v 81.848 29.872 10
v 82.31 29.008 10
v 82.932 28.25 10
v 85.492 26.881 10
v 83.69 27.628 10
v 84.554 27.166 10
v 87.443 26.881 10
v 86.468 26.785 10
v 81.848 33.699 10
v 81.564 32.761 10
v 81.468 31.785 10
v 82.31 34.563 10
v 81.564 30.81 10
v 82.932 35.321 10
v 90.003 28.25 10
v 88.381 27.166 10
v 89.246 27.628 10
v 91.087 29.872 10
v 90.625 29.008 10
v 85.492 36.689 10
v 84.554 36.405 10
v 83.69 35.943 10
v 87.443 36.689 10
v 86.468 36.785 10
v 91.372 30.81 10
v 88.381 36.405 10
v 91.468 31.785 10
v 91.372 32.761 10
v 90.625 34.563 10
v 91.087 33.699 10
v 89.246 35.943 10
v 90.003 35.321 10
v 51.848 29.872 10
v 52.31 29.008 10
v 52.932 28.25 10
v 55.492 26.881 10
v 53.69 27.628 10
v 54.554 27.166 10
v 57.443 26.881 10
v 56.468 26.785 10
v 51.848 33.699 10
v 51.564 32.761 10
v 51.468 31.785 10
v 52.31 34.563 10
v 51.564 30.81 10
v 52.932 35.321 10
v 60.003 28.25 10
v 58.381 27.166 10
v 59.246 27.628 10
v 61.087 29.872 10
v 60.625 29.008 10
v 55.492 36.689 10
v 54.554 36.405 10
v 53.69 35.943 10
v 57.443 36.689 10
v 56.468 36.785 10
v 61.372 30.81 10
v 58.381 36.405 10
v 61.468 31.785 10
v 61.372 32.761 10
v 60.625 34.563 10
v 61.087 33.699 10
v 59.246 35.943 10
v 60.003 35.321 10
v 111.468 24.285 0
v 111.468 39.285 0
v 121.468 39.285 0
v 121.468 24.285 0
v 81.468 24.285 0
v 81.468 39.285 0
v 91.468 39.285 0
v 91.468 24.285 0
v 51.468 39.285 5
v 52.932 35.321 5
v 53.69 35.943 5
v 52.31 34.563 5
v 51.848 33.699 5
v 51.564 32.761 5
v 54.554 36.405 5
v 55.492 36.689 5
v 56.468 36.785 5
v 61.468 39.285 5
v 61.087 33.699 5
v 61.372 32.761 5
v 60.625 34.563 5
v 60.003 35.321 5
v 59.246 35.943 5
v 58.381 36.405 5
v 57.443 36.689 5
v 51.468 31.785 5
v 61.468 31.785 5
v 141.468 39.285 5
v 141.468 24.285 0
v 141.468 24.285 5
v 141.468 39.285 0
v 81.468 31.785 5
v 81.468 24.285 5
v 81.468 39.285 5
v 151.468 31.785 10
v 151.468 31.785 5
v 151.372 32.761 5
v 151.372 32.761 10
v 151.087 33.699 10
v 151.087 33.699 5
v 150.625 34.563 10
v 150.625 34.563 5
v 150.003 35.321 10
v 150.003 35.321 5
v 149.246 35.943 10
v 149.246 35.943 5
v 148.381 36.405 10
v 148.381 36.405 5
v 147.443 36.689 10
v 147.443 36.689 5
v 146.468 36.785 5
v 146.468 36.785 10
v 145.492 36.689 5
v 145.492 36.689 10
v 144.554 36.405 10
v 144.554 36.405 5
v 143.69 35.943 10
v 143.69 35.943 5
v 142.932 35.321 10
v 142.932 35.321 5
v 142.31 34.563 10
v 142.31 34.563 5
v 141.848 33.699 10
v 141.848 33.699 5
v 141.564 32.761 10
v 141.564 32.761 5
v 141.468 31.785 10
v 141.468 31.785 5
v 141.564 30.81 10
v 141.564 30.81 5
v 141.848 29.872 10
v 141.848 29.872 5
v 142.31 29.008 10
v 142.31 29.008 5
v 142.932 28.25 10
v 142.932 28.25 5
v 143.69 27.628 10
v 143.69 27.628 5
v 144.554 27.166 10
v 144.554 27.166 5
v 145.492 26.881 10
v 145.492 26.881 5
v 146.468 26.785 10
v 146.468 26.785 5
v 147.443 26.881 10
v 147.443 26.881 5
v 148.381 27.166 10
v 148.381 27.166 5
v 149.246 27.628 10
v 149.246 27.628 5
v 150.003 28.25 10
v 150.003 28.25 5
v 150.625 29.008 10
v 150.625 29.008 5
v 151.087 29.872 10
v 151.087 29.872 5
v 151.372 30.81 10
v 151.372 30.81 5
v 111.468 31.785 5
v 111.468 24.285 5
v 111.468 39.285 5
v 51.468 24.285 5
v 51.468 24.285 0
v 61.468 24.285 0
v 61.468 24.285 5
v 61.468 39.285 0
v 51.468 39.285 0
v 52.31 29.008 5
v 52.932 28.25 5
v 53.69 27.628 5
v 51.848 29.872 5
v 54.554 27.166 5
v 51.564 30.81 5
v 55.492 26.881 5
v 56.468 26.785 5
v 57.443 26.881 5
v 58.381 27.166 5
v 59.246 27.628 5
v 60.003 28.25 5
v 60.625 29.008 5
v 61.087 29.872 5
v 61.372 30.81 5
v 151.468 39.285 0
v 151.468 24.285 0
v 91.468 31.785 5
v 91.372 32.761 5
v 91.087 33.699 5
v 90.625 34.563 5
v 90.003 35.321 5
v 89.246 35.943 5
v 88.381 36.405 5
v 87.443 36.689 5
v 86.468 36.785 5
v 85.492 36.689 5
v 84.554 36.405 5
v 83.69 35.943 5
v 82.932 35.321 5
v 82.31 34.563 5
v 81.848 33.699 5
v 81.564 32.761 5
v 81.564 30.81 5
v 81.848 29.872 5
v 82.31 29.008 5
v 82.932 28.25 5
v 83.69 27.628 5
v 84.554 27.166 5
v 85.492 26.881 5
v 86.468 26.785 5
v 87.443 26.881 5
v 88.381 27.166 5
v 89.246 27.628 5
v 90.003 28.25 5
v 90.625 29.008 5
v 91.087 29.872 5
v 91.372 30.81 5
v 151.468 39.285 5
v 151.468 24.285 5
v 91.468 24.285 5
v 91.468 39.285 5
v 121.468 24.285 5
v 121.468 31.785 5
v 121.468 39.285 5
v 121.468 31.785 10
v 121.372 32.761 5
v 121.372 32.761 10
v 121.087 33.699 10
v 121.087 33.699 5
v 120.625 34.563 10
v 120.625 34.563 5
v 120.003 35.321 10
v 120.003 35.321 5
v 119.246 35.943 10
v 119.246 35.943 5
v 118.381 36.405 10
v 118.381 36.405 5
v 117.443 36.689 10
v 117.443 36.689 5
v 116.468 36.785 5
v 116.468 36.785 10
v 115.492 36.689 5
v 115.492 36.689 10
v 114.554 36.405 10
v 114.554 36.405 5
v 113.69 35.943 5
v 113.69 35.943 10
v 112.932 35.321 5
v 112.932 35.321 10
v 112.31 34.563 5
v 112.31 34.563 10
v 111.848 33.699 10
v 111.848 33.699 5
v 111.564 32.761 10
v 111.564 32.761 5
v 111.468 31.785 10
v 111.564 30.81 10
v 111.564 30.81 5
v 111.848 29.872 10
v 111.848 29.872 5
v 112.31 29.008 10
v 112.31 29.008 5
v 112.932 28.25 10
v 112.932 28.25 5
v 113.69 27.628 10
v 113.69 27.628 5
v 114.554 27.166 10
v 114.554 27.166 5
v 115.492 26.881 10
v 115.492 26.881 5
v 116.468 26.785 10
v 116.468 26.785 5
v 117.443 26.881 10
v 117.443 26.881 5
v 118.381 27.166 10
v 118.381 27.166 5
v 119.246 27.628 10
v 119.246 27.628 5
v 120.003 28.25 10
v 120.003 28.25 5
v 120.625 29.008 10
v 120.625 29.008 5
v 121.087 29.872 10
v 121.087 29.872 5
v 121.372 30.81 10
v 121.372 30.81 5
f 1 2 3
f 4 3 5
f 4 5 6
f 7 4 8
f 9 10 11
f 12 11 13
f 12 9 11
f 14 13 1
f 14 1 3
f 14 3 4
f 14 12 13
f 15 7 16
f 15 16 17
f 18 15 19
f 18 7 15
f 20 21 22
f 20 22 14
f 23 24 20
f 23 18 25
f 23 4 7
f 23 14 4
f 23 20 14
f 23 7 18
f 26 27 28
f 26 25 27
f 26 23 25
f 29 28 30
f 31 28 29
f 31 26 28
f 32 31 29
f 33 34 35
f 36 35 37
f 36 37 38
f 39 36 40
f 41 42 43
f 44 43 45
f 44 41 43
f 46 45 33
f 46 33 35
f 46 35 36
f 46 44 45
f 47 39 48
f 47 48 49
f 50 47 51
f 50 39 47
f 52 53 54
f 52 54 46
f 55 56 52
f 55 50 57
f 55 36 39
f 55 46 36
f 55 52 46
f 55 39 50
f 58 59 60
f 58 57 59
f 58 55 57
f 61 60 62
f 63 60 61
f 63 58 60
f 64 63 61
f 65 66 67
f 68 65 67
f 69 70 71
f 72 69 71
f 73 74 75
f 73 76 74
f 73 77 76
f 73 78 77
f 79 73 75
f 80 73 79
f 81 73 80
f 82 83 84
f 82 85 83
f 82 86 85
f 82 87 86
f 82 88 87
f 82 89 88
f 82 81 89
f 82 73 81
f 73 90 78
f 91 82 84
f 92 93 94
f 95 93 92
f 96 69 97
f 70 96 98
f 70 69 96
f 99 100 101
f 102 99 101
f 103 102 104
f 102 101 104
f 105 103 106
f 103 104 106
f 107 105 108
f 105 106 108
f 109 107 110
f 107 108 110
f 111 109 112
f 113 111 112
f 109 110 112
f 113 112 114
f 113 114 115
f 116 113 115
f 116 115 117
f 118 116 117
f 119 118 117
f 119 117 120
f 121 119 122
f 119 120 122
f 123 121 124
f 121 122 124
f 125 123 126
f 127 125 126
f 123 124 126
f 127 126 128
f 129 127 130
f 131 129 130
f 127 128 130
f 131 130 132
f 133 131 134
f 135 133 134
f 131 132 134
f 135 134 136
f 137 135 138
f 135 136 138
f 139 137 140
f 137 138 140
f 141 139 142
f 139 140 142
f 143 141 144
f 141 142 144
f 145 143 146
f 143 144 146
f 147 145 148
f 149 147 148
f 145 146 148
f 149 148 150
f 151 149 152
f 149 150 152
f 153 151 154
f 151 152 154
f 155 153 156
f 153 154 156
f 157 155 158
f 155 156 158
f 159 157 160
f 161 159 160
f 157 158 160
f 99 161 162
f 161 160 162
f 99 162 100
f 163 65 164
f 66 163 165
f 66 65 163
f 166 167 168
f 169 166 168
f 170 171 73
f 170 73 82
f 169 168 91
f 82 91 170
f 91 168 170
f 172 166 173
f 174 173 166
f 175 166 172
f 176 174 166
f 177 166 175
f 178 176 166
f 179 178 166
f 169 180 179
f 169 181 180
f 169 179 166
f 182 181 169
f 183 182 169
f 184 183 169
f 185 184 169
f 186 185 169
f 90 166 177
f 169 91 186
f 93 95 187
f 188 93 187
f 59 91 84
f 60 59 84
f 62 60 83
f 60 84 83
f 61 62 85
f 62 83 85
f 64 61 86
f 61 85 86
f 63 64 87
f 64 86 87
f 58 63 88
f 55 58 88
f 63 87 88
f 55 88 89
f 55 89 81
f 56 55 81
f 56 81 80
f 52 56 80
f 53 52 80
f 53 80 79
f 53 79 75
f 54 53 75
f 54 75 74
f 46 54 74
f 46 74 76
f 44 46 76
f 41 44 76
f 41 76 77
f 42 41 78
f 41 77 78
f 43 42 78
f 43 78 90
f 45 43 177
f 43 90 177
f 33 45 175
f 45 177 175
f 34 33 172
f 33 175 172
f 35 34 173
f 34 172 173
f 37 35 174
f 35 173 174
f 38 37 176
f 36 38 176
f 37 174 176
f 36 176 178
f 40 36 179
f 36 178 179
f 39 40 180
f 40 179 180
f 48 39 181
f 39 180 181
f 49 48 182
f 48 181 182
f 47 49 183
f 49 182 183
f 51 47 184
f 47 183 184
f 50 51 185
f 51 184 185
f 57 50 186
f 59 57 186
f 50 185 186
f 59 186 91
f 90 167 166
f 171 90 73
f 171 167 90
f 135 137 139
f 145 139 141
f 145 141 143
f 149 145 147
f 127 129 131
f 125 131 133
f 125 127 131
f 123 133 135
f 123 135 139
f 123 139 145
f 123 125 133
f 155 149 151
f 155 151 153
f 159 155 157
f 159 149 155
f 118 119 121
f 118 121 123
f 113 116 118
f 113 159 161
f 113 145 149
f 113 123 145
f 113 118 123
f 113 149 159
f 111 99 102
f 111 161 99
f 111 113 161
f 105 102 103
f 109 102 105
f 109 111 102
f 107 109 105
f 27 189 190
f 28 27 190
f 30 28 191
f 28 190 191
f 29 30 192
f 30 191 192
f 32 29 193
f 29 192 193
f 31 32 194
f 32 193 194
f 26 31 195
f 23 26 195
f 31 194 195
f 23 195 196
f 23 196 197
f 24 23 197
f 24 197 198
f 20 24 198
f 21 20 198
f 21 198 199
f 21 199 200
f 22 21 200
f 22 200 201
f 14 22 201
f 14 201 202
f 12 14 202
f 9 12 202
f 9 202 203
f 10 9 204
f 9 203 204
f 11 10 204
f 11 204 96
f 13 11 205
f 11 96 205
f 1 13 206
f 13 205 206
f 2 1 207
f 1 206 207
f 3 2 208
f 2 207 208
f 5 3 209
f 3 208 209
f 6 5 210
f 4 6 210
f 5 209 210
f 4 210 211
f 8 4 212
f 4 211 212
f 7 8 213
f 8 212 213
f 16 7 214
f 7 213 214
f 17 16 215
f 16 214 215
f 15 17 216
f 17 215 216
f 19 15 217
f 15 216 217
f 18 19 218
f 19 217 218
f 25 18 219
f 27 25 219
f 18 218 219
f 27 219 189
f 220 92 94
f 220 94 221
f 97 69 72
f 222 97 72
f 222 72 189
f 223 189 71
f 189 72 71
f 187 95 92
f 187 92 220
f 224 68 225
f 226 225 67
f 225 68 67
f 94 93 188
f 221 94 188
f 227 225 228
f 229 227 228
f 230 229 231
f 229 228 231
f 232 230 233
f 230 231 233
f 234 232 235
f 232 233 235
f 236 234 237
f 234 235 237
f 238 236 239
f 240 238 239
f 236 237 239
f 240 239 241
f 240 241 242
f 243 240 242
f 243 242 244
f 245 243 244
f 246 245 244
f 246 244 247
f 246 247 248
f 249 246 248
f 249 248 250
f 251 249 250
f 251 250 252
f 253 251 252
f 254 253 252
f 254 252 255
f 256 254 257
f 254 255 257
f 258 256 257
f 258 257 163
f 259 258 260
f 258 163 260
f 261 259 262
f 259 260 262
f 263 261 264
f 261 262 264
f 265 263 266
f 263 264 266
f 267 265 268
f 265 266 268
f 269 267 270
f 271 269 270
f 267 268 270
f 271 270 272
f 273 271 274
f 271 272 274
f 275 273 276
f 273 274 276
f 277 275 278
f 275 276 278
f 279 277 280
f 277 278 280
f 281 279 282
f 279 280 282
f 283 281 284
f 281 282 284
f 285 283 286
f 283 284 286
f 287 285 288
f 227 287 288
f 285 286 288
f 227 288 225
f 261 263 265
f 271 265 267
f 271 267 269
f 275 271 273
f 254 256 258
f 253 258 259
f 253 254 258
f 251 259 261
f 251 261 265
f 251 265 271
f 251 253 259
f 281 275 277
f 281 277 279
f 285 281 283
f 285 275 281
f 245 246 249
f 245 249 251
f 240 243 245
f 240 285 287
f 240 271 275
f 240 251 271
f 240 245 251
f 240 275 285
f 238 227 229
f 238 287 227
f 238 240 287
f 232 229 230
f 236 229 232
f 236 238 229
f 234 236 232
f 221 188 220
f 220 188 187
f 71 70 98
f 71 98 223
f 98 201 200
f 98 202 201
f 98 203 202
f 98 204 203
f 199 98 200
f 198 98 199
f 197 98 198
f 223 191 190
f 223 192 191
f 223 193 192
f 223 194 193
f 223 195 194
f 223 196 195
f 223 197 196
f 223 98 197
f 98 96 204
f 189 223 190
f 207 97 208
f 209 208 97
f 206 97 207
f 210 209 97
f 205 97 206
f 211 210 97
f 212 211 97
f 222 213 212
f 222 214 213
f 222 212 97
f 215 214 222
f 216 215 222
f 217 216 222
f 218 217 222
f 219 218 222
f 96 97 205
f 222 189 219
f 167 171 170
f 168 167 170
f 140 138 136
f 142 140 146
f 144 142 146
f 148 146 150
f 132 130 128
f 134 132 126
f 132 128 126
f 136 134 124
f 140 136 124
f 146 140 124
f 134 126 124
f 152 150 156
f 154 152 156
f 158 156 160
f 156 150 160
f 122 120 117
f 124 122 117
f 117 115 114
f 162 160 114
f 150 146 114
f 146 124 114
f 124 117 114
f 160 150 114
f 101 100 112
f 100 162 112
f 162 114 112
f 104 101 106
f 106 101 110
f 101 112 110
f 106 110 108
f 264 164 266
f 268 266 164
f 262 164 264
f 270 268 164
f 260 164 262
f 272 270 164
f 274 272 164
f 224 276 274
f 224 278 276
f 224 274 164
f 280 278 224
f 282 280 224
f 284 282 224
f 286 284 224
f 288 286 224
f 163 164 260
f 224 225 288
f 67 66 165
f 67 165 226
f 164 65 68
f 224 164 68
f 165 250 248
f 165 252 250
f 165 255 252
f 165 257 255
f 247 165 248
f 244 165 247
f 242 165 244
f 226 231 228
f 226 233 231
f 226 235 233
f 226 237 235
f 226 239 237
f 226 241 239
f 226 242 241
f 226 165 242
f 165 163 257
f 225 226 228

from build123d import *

# Parameters (mm, degrees)
SKETCH_1_W        = 10
SKETCH_1_H        = 15
EXTRUDE_1_DEPTH   = 5
EXTRUDE_1_2_DEPTH = 5
EXTRUDE_1_3_DEPTH = 5
EXTRUDE_1_4_DEPTH = 5
SKETCH_3_R        = 5
EXTRUDE_2_DEPTH   = 5


with BuildPart() as part:
    # 草图1 → 凸台-拉伸1 (new body)
    with BuildSketch(Plane.XY):
        with Locations((116.467654294, 31.785358307)):
            Rectangle(SKETCH_1_W, SKETCH_1_H)
    extrude(amount=EXTRUDE_1_DEPTH)



with BuildPart() as body_2:
    # 草图1 → Extrude 1 2 (new body)
    with BuildSketch(Plane.XY):
        with Locations((86.467654294, 31.785358307)):
            Rectangle(SKETCH_1_W, SKETCH_1_H)
    extrude(amount=EXTRUDE_1_2_DEPTH)


with BuildPart() as body_3:
    # 草图1 → Extrude 1 3 (new body)
    with BuildSketch(Plane.XY):
        with Locations((56.467654294, 31.785358307)):
            Rectangle(SKETCH_1_W, SKETCH_1_H)
    extrude(amount=EXTRUDE_1_3_DEPTH)


with BuildPart() as body_4:
    # 草图1 → Extrude 1 4 (new body)
    with BuildSketch(Plane.XY):
        with Locations((146.467654294, 31.785358307)):
            Rectangle(SKETCH_1_W, SKETCH_1_H)
    extrude(amount=EXTRUDE_1_4_DEPTH)


with BuildPart() as part_1:
    add(part.part)

    add(body_2.part)  # 凸台-拉伸2 merges body 2

    add(body_3.part)  # 凸台-拉伸2 merges body 3
    # 草图3 → 凸台-拉伸2 (add)
    with BuildSketch(Plane.XY.offset(5)):
        with Locations((116.467654294, 31.785358307)):
            Circle(SKETCH_3_R)
        with Locations((86.467654294, 31.785358307)):
            Circle(SKETCH_3_R)
        with Locations((56.467654294, 31.785358307)):
            Circle(SKETCH_3_R)
        with Locations((146.467654294, 31.785358307)):
            Circle(SKETCH_3_R)
    extrude(amount=EXTRUDE_2_DEPTH)


solid = Compound([body_4.part, part_1.part])
